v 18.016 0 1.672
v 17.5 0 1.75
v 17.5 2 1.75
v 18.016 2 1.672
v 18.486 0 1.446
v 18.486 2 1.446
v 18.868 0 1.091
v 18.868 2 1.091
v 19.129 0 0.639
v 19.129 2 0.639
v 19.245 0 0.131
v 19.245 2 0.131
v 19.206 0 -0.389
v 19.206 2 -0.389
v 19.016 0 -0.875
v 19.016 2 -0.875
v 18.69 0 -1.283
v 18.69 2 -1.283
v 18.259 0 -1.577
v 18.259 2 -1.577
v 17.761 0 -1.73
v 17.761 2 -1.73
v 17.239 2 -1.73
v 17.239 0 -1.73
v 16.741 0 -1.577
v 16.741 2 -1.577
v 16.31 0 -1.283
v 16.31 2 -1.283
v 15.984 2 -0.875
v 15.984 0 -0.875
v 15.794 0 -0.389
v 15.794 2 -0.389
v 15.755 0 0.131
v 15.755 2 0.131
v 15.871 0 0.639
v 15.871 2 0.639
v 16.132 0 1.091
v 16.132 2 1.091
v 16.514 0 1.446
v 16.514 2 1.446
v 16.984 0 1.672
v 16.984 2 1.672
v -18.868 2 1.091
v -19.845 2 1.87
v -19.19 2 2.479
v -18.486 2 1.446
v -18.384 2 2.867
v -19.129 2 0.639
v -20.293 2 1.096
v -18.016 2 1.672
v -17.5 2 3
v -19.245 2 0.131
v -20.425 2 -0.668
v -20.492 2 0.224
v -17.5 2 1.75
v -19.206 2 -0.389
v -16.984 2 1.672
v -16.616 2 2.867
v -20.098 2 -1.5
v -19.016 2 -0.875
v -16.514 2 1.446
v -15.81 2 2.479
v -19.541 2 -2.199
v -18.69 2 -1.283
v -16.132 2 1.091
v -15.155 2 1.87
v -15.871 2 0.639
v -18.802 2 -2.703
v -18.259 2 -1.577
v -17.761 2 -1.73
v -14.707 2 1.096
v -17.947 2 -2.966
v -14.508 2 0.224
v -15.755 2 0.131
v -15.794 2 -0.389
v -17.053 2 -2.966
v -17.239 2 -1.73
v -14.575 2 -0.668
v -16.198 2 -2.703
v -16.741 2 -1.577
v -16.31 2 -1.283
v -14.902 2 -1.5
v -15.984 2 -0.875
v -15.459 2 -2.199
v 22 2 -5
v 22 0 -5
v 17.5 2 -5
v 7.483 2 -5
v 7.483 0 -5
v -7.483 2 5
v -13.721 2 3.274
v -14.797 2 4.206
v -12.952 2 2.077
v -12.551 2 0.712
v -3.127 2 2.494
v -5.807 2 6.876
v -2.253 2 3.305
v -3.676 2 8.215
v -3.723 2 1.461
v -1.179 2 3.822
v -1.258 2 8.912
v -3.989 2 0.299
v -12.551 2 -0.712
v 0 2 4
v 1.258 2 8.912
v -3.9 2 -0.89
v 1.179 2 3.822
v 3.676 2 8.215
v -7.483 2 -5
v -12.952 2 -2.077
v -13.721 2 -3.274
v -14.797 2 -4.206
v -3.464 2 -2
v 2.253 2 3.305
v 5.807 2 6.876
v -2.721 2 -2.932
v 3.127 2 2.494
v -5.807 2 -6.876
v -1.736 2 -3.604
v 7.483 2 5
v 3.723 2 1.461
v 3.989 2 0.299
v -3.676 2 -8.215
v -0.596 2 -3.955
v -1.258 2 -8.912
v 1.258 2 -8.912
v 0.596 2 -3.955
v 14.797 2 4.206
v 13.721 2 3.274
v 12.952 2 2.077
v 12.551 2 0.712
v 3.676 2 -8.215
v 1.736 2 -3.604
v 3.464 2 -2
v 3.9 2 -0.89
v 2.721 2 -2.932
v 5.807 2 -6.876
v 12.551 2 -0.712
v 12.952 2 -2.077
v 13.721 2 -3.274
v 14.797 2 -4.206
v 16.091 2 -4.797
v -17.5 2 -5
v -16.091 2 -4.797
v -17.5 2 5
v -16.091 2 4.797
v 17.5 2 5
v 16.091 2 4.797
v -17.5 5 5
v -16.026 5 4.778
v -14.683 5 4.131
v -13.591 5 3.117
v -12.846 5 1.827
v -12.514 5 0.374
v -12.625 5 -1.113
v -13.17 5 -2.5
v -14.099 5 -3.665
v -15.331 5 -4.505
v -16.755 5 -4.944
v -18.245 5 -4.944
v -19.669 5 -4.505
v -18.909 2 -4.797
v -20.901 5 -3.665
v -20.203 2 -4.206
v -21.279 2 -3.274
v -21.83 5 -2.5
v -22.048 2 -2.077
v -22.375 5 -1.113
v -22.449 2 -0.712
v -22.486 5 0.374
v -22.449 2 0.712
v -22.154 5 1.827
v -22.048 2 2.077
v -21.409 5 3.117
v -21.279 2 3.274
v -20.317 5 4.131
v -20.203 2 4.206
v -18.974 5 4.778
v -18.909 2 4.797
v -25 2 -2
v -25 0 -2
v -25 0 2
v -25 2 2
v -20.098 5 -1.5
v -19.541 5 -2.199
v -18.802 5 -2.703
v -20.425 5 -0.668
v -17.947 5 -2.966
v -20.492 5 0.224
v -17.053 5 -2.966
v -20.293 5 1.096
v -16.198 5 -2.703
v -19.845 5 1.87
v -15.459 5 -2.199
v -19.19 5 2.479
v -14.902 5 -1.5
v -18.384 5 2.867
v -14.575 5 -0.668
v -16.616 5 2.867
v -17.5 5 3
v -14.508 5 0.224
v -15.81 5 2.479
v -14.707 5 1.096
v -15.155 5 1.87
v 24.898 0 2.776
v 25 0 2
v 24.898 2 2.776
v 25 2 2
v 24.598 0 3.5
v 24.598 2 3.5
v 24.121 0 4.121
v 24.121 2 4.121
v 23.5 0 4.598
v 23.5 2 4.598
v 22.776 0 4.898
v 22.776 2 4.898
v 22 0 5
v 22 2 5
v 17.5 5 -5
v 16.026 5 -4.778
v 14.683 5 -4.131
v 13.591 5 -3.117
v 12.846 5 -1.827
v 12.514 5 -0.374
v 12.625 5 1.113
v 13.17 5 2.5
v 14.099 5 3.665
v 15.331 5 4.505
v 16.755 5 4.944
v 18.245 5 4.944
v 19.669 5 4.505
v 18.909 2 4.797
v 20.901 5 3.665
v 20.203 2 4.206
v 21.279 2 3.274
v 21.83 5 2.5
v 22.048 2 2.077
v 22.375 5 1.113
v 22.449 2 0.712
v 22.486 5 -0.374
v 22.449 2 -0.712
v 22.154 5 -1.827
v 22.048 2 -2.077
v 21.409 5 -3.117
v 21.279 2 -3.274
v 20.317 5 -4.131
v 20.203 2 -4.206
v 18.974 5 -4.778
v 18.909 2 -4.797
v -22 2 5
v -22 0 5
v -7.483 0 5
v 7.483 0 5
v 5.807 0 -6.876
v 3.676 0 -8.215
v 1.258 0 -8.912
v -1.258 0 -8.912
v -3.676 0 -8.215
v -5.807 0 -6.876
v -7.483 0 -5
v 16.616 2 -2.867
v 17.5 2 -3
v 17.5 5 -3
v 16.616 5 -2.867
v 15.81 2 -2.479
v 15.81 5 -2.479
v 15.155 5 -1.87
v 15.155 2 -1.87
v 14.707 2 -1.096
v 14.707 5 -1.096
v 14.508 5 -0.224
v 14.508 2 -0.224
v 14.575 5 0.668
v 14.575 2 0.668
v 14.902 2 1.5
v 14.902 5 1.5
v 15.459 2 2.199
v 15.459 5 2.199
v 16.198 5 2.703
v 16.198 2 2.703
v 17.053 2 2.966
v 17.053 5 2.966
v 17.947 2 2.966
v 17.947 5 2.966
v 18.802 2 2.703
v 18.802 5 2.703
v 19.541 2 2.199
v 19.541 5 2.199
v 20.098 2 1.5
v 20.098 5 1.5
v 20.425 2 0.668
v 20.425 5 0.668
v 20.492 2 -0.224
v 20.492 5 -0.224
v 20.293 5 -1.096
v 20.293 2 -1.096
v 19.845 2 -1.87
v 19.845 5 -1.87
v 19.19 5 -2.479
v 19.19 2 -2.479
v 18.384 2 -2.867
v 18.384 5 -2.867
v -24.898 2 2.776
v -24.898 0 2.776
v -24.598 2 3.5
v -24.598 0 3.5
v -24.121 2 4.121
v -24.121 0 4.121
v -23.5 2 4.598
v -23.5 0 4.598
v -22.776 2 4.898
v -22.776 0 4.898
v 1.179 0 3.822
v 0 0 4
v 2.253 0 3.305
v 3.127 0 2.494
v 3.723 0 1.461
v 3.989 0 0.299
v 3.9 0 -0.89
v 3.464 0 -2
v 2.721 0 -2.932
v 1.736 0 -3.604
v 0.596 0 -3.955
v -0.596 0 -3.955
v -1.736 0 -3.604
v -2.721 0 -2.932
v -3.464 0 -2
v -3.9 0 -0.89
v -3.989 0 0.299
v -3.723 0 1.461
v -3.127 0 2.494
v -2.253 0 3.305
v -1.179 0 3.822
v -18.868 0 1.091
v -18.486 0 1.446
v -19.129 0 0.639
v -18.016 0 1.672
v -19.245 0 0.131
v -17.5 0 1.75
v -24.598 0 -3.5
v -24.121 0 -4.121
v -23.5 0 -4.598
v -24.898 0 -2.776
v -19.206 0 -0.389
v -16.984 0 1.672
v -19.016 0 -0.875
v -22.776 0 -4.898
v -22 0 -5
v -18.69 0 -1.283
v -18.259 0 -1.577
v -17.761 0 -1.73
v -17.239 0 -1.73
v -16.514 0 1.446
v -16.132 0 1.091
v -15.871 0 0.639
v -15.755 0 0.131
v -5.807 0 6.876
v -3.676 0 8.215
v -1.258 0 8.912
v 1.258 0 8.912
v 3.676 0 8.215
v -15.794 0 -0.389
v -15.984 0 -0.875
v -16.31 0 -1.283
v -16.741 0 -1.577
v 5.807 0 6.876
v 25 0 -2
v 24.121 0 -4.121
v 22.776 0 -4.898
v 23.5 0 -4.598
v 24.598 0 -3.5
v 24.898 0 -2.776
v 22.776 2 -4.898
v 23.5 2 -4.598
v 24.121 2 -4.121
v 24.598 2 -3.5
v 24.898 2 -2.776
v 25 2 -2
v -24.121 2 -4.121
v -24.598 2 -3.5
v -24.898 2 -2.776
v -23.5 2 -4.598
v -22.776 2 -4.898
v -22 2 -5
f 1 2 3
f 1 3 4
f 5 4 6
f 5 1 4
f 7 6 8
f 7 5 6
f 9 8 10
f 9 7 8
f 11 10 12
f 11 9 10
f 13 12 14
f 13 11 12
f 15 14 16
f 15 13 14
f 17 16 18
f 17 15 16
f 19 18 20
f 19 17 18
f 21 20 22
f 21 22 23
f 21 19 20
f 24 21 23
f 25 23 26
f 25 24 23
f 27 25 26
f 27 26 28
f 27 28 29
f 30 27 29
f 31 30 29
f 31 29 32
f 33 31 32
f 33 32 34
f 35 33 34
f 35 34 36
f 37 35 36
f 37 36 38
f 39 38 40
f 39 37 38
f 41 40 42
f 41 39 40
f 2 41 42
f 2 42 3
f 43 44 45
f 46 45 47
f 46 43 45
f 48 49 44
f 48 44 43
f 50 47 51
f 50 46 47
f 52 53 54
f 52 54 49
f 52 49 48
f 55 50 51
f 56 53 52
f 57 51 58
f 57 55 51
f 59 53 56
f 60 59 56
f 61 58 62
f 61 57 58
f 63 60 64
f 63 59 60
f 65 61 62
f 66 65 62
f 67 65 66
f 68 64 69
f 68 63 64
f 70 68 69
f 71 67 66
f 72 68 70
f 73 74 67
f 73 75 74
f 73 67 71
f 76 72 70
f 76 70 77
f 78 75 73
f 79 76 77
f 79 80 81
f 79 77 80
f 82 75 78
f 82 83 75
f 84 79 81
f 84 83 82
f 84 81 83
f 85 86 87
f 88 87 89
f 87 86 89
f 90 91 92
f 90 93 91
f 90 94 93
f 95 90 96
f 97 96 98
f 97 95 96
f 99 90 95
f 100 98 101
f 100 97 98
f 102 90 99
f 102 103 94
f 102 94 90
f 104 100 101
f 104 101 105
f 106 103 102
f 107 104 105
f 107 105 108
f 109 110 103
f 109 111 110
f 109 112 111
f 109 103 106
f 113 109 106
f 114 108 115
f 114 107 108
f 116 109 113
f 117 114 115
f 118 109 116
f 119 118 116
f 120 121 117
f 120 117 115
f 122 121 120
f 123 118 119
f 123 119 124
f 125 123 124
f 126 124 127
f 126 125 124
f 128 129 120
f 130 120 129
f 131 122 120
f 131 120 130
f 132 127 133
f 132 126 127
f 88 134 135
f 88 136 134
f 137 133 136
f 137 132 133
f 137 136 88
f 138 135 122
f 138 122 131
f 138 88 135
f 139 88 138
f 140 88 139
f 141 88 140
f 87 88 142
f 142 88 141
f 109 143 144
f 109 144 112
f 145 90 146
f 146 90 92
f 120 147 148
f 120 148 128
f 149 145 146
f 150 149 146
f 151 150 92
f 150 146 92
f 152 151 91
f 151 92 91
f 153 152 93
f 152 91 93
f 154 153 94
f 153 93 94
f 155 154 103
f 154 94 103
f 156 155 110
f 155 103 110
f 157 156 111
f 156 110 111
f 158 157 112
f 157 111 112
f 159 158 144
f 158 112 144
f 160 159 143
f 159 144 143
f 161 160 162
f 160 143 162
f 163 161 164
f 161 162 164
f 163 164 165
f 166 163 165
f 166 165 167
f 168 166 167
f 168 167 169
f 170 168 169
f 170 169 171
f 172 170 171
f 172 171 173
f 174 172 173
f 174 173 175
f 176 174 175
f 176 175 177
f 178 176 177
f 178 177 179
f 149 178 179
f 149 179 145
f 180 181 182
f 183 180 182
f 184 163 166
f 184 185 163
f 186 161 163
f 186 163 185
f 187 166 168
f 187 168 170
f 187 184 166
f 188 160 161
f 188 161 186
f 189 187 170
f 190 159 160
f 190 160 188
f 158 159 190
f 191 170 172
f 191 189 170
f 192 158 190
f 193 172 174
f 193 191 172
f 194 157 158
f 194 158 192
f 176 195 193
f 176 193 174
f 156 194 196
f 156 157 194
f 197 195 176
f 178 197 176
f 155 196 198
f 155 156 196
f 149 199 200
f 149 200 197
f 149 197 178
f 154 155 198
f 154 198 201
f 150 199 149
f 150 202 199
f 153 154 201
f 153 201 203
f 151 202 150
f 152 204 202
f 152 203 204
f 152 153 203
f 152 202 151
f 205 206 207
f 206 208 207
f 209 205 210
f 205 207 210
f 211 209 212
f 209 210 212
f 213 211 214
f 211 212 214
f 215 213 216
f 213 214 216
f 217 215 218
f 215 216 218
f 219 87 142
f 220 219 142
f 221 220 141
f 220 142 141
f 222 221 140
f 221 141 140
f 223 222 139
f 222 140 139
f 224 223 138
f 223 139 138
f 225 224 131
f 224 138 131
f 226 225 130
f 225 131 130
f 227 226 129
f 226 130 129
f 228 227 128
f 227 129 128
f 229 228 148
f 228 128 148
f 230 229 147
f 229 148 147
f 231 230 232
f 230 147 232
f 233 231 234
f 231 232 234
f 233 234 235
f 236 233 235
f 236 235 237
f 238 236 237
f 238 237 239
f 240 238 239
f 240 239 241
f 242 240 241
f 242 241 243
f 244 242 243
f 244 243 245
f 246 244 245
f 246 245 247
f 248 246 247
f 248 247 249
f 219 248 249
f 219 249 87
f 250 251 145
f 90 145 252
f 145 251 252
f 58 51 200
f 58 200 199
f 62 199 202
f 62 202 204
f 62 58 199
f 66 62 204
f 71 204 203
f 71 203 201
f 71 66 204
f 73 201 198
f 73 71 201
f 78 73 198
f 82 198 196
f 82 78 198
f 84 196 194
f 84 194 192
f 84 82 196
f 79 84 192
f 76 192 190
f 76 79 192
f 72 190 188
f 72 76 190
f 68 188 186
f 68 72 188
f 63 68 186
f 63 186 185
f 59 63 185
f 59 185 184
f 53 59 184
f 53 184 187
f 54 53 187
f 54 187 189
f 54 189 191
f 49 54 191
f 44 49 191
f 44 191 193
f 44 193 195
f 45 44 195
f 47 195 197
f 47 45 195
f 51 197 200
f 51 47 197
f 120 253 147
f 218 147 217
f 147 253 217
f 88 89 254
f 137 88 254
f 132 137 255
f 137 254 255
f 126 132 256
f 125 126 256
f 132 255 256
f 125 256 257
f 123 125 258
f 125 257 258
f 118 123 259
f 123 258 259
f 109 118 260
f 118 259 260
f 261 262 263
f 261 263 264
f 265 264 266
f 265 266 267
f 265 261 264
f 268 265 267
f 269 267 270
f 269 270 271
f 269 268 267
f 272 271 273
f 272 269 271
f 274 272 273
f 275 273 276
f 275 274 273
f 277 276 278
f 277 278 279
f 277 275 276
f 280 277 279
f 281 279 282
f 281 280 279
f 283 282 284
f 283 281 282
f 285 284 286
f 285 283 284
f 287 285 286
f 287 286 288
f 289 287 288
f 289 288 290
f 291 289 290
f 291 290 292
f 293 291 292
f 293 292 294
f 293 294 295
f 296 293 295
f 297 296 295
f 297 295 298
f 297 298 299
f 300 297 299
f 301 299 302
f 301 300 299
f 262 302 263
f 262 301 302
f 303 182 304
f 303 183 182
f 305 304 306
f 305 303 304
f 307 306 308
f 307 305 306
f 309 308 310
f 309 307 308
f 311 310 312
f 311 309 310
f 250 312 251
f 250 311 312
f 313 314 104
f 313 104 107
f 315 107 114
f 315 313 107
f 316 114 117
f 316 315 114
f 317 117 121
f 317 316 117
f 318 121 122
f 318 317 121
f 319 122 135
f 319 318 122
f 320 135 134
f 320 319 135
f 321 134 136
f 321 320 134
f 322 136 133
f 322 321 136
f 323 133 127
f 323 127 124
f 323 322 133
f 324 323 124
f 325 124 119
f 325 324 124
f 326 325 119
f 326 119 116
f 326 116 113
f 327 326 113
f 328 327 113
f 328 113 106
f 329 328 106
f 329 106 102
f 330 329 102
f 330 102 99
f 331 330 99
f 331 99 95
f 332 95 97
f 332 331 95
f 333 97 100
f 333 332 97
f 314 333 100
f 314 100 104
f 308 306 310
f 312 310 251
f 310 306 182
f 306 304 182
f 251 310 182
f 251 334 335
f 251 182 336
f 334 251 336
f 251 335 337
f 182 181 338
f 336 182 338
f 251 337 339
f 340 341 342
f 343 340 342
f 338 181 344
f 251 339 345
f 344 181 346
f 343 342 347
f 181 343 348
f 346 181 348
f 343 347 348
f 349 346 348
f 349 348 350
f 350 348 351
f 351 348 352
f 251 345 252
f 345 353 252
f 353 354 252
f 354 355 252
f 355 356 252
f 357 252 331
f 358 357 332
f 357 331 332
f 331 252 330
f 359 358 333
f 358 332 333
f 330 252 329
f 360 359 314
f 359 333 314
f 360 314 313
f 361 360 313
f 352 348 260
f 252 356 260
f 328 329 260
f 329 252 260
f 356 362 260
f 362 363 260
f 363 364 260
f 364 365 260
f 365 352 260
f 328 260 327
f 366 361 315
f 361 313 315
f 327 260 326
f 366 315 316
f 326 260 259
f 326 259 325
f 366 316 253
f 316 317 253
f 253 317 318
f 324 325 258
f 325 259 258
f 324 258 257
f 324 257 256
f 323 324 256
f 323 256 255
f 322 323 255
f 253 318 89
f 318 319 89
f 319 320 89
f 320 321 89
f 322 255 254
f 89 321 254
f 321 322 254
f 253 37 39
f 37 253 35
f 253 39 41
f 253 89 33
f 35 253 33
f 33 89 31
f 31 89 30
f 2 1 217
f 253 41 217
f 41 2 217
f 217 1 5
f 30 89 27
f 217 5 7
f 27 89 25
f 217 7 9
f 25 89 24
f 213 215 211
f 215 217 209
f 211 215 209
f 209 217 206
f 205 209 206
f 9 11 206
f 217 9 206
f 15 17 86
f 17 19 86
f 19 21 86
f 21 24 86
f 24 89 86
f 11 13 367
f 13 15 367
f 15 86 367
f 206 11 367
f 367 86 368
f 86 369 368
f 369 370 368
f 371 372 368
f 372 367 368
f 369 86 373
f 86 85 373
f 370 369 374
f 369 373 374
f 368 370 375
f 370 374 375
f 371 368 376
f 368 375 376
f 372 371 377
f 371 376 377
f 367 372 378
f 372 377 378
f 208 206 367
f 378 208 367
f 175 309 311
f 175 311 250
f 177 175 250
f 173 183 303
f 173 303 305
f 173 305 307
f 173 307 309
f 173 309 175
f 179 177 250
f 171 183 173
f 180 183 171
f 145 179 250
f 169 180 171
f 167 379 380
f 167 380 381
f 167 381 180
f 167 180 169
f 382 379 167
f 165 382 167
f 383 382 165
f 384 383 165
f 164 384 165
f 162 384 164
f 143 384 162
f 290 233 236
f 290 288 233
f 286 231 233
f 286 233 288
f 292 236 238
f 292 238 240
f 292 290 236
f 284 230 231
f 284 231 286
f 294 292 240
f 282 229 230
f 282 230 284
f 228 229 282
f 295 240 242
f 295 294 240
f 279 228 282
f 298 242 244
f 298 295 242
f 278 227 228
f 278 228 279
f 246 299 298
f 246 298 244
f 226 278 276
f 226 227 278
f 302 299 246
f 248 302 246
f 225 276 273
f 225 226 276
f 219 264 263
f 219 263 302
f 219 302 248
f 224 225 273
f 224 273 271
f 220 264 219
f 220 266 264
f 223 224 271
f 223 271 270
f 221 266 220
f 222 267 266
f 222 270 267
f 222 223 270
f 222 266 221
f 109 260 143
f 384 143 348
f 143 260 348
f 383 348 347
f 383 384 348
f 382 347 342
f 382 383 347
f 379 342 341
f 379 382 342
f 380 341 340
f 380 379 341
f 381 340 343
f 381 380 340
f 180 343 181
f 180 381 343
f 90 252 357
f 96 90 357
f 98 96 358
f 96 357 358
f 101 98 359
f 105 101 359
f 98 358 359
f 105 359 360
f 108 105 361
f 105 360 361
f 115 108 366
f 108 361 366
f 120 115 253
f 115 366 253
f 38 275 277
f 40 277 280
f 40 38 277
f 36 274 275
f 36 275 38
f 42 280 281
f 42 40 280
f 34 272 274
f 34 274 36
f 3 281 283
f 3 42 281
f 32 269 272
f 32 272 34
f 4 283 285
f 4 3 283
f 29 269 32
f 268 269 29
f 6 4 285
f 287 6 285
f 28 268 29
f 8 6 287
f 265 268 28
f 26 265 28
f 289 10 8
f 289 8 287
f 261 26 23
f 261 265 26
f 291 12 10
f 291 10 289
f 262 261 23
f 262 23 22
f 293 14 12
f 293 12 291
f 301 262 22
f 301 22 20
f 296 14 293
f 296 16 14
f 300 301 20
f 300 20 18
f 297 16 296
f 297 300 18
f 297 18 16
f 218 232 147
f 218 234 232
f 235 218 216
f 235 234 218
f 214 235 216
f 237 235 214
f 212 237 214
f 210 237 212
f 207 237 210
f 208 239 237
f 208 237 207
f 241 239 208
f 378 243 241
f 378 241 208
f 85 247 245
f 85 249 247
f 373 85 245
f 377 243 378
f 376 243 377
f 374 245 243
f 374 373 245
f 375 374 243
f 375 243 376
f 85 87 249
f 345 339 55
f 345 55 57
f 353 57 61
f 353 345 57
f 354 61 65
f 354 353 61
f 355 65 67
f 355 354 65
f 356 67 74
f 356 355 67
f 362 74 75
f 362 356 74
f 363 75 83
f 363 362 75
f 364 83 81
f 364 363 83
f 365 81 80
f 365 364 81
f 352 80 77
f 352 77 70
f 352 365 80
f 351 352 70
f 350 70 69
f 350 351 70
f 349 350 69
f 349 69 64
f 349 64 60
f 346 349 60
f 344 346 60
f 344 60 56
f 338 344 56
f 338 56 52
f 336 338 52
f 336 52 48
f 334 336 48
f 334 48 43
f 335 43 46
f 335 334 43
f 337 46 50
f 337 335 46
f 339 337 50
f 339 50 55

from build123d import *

# Parameters (mm, degrees)
SKETCH1_R           = 1.75
SKETCH1_R_2         = 4
BOSS_EXTRUDE1_DEPTH = 2
FILLET1_R           = 3
SKETCH2_R           = 5
SKETCH2_R_2         = 3
BOSS_EXTRUDE2_DEPTH = 3


with BuildPart() as part:
    # Sketch1 → Boss-Extrude1 (new body)
    with BuildSketch(Plane(origin=(0, 0, 0), x_dir=(1, 0, 0), z_dir=(0, 1, 0))):
        with BuildLine():
            Line((-7.483314774, 5), (-25, 5))
            Line((-25, 5), (-25, -5))
            Line((-25, -5), (-7.483314774, -5))
            ThreePointArc((-7.483314774, -5), (0, -9), (7.483314774, -5))
            Line((7.483314774, -5), (25, -5))
            Line((25, -5), (25, 5))
            Line((25, 5), (7.483314774, 5))
            ThreePointArc((7.483314774, 5), (0, 9), (-7.483314774, 5))
        make_face()
        with Locations((-17.5, 0)):
            Circle(SKETCH1_R, mode=Mode.SUBTRACT)
        Circle(SKETCH1_R_2, mode=Mode.SUBTRACT)
        with Locations((17.5, 0)):
            Circle(SKETCH1_R, mode=Mode.SUBTRACT)
    extrude(amount=BOSS_EXTRUDE1_DEPTH)

    # Fillet1
    fillet1_edges = [part.edges().sort_by_distance(p)[0] for p in [
        (-25, 1, -5),
        (25, 1, -5),
        (25, 1, 5),
        (-25, 1, 5),
    ]]
    fillet(fillet1_edges, radius=FILLET1_R)

    # Sketch2 → Boss-Extrude2 (add)
    # profile 1 of 2: a face of its own
    with BuildSketch(Plane(origin=(0, 2, 0), x_dir=(1, 0, 0), z_dir=(0, 1, 0))):
        with Locations((-17.5, 0)):
            Circle(SKETCH2_R)
        with Locations((-17.5, 0)):
            Circle(SKETCH2_R_2, mode=Mode.SUBTRACT)
    # profile 2 of 2: a face of its own
    with BuildSketch(Plane(origin=(0, 2, 0), x_dir=(1, 0, 0), z_dir=(0, 1, 0))):
        with Locations((17.5, 0)):
            Circle(SKETCH2_R)
        with Locations((17.5, 0)):
            Circle(SKETCH2_R_2, mode=Mode.SUBTRACT)
    extrude(amount=BOSS_EXTRUDE2_DEPTH)


solid = part.part
